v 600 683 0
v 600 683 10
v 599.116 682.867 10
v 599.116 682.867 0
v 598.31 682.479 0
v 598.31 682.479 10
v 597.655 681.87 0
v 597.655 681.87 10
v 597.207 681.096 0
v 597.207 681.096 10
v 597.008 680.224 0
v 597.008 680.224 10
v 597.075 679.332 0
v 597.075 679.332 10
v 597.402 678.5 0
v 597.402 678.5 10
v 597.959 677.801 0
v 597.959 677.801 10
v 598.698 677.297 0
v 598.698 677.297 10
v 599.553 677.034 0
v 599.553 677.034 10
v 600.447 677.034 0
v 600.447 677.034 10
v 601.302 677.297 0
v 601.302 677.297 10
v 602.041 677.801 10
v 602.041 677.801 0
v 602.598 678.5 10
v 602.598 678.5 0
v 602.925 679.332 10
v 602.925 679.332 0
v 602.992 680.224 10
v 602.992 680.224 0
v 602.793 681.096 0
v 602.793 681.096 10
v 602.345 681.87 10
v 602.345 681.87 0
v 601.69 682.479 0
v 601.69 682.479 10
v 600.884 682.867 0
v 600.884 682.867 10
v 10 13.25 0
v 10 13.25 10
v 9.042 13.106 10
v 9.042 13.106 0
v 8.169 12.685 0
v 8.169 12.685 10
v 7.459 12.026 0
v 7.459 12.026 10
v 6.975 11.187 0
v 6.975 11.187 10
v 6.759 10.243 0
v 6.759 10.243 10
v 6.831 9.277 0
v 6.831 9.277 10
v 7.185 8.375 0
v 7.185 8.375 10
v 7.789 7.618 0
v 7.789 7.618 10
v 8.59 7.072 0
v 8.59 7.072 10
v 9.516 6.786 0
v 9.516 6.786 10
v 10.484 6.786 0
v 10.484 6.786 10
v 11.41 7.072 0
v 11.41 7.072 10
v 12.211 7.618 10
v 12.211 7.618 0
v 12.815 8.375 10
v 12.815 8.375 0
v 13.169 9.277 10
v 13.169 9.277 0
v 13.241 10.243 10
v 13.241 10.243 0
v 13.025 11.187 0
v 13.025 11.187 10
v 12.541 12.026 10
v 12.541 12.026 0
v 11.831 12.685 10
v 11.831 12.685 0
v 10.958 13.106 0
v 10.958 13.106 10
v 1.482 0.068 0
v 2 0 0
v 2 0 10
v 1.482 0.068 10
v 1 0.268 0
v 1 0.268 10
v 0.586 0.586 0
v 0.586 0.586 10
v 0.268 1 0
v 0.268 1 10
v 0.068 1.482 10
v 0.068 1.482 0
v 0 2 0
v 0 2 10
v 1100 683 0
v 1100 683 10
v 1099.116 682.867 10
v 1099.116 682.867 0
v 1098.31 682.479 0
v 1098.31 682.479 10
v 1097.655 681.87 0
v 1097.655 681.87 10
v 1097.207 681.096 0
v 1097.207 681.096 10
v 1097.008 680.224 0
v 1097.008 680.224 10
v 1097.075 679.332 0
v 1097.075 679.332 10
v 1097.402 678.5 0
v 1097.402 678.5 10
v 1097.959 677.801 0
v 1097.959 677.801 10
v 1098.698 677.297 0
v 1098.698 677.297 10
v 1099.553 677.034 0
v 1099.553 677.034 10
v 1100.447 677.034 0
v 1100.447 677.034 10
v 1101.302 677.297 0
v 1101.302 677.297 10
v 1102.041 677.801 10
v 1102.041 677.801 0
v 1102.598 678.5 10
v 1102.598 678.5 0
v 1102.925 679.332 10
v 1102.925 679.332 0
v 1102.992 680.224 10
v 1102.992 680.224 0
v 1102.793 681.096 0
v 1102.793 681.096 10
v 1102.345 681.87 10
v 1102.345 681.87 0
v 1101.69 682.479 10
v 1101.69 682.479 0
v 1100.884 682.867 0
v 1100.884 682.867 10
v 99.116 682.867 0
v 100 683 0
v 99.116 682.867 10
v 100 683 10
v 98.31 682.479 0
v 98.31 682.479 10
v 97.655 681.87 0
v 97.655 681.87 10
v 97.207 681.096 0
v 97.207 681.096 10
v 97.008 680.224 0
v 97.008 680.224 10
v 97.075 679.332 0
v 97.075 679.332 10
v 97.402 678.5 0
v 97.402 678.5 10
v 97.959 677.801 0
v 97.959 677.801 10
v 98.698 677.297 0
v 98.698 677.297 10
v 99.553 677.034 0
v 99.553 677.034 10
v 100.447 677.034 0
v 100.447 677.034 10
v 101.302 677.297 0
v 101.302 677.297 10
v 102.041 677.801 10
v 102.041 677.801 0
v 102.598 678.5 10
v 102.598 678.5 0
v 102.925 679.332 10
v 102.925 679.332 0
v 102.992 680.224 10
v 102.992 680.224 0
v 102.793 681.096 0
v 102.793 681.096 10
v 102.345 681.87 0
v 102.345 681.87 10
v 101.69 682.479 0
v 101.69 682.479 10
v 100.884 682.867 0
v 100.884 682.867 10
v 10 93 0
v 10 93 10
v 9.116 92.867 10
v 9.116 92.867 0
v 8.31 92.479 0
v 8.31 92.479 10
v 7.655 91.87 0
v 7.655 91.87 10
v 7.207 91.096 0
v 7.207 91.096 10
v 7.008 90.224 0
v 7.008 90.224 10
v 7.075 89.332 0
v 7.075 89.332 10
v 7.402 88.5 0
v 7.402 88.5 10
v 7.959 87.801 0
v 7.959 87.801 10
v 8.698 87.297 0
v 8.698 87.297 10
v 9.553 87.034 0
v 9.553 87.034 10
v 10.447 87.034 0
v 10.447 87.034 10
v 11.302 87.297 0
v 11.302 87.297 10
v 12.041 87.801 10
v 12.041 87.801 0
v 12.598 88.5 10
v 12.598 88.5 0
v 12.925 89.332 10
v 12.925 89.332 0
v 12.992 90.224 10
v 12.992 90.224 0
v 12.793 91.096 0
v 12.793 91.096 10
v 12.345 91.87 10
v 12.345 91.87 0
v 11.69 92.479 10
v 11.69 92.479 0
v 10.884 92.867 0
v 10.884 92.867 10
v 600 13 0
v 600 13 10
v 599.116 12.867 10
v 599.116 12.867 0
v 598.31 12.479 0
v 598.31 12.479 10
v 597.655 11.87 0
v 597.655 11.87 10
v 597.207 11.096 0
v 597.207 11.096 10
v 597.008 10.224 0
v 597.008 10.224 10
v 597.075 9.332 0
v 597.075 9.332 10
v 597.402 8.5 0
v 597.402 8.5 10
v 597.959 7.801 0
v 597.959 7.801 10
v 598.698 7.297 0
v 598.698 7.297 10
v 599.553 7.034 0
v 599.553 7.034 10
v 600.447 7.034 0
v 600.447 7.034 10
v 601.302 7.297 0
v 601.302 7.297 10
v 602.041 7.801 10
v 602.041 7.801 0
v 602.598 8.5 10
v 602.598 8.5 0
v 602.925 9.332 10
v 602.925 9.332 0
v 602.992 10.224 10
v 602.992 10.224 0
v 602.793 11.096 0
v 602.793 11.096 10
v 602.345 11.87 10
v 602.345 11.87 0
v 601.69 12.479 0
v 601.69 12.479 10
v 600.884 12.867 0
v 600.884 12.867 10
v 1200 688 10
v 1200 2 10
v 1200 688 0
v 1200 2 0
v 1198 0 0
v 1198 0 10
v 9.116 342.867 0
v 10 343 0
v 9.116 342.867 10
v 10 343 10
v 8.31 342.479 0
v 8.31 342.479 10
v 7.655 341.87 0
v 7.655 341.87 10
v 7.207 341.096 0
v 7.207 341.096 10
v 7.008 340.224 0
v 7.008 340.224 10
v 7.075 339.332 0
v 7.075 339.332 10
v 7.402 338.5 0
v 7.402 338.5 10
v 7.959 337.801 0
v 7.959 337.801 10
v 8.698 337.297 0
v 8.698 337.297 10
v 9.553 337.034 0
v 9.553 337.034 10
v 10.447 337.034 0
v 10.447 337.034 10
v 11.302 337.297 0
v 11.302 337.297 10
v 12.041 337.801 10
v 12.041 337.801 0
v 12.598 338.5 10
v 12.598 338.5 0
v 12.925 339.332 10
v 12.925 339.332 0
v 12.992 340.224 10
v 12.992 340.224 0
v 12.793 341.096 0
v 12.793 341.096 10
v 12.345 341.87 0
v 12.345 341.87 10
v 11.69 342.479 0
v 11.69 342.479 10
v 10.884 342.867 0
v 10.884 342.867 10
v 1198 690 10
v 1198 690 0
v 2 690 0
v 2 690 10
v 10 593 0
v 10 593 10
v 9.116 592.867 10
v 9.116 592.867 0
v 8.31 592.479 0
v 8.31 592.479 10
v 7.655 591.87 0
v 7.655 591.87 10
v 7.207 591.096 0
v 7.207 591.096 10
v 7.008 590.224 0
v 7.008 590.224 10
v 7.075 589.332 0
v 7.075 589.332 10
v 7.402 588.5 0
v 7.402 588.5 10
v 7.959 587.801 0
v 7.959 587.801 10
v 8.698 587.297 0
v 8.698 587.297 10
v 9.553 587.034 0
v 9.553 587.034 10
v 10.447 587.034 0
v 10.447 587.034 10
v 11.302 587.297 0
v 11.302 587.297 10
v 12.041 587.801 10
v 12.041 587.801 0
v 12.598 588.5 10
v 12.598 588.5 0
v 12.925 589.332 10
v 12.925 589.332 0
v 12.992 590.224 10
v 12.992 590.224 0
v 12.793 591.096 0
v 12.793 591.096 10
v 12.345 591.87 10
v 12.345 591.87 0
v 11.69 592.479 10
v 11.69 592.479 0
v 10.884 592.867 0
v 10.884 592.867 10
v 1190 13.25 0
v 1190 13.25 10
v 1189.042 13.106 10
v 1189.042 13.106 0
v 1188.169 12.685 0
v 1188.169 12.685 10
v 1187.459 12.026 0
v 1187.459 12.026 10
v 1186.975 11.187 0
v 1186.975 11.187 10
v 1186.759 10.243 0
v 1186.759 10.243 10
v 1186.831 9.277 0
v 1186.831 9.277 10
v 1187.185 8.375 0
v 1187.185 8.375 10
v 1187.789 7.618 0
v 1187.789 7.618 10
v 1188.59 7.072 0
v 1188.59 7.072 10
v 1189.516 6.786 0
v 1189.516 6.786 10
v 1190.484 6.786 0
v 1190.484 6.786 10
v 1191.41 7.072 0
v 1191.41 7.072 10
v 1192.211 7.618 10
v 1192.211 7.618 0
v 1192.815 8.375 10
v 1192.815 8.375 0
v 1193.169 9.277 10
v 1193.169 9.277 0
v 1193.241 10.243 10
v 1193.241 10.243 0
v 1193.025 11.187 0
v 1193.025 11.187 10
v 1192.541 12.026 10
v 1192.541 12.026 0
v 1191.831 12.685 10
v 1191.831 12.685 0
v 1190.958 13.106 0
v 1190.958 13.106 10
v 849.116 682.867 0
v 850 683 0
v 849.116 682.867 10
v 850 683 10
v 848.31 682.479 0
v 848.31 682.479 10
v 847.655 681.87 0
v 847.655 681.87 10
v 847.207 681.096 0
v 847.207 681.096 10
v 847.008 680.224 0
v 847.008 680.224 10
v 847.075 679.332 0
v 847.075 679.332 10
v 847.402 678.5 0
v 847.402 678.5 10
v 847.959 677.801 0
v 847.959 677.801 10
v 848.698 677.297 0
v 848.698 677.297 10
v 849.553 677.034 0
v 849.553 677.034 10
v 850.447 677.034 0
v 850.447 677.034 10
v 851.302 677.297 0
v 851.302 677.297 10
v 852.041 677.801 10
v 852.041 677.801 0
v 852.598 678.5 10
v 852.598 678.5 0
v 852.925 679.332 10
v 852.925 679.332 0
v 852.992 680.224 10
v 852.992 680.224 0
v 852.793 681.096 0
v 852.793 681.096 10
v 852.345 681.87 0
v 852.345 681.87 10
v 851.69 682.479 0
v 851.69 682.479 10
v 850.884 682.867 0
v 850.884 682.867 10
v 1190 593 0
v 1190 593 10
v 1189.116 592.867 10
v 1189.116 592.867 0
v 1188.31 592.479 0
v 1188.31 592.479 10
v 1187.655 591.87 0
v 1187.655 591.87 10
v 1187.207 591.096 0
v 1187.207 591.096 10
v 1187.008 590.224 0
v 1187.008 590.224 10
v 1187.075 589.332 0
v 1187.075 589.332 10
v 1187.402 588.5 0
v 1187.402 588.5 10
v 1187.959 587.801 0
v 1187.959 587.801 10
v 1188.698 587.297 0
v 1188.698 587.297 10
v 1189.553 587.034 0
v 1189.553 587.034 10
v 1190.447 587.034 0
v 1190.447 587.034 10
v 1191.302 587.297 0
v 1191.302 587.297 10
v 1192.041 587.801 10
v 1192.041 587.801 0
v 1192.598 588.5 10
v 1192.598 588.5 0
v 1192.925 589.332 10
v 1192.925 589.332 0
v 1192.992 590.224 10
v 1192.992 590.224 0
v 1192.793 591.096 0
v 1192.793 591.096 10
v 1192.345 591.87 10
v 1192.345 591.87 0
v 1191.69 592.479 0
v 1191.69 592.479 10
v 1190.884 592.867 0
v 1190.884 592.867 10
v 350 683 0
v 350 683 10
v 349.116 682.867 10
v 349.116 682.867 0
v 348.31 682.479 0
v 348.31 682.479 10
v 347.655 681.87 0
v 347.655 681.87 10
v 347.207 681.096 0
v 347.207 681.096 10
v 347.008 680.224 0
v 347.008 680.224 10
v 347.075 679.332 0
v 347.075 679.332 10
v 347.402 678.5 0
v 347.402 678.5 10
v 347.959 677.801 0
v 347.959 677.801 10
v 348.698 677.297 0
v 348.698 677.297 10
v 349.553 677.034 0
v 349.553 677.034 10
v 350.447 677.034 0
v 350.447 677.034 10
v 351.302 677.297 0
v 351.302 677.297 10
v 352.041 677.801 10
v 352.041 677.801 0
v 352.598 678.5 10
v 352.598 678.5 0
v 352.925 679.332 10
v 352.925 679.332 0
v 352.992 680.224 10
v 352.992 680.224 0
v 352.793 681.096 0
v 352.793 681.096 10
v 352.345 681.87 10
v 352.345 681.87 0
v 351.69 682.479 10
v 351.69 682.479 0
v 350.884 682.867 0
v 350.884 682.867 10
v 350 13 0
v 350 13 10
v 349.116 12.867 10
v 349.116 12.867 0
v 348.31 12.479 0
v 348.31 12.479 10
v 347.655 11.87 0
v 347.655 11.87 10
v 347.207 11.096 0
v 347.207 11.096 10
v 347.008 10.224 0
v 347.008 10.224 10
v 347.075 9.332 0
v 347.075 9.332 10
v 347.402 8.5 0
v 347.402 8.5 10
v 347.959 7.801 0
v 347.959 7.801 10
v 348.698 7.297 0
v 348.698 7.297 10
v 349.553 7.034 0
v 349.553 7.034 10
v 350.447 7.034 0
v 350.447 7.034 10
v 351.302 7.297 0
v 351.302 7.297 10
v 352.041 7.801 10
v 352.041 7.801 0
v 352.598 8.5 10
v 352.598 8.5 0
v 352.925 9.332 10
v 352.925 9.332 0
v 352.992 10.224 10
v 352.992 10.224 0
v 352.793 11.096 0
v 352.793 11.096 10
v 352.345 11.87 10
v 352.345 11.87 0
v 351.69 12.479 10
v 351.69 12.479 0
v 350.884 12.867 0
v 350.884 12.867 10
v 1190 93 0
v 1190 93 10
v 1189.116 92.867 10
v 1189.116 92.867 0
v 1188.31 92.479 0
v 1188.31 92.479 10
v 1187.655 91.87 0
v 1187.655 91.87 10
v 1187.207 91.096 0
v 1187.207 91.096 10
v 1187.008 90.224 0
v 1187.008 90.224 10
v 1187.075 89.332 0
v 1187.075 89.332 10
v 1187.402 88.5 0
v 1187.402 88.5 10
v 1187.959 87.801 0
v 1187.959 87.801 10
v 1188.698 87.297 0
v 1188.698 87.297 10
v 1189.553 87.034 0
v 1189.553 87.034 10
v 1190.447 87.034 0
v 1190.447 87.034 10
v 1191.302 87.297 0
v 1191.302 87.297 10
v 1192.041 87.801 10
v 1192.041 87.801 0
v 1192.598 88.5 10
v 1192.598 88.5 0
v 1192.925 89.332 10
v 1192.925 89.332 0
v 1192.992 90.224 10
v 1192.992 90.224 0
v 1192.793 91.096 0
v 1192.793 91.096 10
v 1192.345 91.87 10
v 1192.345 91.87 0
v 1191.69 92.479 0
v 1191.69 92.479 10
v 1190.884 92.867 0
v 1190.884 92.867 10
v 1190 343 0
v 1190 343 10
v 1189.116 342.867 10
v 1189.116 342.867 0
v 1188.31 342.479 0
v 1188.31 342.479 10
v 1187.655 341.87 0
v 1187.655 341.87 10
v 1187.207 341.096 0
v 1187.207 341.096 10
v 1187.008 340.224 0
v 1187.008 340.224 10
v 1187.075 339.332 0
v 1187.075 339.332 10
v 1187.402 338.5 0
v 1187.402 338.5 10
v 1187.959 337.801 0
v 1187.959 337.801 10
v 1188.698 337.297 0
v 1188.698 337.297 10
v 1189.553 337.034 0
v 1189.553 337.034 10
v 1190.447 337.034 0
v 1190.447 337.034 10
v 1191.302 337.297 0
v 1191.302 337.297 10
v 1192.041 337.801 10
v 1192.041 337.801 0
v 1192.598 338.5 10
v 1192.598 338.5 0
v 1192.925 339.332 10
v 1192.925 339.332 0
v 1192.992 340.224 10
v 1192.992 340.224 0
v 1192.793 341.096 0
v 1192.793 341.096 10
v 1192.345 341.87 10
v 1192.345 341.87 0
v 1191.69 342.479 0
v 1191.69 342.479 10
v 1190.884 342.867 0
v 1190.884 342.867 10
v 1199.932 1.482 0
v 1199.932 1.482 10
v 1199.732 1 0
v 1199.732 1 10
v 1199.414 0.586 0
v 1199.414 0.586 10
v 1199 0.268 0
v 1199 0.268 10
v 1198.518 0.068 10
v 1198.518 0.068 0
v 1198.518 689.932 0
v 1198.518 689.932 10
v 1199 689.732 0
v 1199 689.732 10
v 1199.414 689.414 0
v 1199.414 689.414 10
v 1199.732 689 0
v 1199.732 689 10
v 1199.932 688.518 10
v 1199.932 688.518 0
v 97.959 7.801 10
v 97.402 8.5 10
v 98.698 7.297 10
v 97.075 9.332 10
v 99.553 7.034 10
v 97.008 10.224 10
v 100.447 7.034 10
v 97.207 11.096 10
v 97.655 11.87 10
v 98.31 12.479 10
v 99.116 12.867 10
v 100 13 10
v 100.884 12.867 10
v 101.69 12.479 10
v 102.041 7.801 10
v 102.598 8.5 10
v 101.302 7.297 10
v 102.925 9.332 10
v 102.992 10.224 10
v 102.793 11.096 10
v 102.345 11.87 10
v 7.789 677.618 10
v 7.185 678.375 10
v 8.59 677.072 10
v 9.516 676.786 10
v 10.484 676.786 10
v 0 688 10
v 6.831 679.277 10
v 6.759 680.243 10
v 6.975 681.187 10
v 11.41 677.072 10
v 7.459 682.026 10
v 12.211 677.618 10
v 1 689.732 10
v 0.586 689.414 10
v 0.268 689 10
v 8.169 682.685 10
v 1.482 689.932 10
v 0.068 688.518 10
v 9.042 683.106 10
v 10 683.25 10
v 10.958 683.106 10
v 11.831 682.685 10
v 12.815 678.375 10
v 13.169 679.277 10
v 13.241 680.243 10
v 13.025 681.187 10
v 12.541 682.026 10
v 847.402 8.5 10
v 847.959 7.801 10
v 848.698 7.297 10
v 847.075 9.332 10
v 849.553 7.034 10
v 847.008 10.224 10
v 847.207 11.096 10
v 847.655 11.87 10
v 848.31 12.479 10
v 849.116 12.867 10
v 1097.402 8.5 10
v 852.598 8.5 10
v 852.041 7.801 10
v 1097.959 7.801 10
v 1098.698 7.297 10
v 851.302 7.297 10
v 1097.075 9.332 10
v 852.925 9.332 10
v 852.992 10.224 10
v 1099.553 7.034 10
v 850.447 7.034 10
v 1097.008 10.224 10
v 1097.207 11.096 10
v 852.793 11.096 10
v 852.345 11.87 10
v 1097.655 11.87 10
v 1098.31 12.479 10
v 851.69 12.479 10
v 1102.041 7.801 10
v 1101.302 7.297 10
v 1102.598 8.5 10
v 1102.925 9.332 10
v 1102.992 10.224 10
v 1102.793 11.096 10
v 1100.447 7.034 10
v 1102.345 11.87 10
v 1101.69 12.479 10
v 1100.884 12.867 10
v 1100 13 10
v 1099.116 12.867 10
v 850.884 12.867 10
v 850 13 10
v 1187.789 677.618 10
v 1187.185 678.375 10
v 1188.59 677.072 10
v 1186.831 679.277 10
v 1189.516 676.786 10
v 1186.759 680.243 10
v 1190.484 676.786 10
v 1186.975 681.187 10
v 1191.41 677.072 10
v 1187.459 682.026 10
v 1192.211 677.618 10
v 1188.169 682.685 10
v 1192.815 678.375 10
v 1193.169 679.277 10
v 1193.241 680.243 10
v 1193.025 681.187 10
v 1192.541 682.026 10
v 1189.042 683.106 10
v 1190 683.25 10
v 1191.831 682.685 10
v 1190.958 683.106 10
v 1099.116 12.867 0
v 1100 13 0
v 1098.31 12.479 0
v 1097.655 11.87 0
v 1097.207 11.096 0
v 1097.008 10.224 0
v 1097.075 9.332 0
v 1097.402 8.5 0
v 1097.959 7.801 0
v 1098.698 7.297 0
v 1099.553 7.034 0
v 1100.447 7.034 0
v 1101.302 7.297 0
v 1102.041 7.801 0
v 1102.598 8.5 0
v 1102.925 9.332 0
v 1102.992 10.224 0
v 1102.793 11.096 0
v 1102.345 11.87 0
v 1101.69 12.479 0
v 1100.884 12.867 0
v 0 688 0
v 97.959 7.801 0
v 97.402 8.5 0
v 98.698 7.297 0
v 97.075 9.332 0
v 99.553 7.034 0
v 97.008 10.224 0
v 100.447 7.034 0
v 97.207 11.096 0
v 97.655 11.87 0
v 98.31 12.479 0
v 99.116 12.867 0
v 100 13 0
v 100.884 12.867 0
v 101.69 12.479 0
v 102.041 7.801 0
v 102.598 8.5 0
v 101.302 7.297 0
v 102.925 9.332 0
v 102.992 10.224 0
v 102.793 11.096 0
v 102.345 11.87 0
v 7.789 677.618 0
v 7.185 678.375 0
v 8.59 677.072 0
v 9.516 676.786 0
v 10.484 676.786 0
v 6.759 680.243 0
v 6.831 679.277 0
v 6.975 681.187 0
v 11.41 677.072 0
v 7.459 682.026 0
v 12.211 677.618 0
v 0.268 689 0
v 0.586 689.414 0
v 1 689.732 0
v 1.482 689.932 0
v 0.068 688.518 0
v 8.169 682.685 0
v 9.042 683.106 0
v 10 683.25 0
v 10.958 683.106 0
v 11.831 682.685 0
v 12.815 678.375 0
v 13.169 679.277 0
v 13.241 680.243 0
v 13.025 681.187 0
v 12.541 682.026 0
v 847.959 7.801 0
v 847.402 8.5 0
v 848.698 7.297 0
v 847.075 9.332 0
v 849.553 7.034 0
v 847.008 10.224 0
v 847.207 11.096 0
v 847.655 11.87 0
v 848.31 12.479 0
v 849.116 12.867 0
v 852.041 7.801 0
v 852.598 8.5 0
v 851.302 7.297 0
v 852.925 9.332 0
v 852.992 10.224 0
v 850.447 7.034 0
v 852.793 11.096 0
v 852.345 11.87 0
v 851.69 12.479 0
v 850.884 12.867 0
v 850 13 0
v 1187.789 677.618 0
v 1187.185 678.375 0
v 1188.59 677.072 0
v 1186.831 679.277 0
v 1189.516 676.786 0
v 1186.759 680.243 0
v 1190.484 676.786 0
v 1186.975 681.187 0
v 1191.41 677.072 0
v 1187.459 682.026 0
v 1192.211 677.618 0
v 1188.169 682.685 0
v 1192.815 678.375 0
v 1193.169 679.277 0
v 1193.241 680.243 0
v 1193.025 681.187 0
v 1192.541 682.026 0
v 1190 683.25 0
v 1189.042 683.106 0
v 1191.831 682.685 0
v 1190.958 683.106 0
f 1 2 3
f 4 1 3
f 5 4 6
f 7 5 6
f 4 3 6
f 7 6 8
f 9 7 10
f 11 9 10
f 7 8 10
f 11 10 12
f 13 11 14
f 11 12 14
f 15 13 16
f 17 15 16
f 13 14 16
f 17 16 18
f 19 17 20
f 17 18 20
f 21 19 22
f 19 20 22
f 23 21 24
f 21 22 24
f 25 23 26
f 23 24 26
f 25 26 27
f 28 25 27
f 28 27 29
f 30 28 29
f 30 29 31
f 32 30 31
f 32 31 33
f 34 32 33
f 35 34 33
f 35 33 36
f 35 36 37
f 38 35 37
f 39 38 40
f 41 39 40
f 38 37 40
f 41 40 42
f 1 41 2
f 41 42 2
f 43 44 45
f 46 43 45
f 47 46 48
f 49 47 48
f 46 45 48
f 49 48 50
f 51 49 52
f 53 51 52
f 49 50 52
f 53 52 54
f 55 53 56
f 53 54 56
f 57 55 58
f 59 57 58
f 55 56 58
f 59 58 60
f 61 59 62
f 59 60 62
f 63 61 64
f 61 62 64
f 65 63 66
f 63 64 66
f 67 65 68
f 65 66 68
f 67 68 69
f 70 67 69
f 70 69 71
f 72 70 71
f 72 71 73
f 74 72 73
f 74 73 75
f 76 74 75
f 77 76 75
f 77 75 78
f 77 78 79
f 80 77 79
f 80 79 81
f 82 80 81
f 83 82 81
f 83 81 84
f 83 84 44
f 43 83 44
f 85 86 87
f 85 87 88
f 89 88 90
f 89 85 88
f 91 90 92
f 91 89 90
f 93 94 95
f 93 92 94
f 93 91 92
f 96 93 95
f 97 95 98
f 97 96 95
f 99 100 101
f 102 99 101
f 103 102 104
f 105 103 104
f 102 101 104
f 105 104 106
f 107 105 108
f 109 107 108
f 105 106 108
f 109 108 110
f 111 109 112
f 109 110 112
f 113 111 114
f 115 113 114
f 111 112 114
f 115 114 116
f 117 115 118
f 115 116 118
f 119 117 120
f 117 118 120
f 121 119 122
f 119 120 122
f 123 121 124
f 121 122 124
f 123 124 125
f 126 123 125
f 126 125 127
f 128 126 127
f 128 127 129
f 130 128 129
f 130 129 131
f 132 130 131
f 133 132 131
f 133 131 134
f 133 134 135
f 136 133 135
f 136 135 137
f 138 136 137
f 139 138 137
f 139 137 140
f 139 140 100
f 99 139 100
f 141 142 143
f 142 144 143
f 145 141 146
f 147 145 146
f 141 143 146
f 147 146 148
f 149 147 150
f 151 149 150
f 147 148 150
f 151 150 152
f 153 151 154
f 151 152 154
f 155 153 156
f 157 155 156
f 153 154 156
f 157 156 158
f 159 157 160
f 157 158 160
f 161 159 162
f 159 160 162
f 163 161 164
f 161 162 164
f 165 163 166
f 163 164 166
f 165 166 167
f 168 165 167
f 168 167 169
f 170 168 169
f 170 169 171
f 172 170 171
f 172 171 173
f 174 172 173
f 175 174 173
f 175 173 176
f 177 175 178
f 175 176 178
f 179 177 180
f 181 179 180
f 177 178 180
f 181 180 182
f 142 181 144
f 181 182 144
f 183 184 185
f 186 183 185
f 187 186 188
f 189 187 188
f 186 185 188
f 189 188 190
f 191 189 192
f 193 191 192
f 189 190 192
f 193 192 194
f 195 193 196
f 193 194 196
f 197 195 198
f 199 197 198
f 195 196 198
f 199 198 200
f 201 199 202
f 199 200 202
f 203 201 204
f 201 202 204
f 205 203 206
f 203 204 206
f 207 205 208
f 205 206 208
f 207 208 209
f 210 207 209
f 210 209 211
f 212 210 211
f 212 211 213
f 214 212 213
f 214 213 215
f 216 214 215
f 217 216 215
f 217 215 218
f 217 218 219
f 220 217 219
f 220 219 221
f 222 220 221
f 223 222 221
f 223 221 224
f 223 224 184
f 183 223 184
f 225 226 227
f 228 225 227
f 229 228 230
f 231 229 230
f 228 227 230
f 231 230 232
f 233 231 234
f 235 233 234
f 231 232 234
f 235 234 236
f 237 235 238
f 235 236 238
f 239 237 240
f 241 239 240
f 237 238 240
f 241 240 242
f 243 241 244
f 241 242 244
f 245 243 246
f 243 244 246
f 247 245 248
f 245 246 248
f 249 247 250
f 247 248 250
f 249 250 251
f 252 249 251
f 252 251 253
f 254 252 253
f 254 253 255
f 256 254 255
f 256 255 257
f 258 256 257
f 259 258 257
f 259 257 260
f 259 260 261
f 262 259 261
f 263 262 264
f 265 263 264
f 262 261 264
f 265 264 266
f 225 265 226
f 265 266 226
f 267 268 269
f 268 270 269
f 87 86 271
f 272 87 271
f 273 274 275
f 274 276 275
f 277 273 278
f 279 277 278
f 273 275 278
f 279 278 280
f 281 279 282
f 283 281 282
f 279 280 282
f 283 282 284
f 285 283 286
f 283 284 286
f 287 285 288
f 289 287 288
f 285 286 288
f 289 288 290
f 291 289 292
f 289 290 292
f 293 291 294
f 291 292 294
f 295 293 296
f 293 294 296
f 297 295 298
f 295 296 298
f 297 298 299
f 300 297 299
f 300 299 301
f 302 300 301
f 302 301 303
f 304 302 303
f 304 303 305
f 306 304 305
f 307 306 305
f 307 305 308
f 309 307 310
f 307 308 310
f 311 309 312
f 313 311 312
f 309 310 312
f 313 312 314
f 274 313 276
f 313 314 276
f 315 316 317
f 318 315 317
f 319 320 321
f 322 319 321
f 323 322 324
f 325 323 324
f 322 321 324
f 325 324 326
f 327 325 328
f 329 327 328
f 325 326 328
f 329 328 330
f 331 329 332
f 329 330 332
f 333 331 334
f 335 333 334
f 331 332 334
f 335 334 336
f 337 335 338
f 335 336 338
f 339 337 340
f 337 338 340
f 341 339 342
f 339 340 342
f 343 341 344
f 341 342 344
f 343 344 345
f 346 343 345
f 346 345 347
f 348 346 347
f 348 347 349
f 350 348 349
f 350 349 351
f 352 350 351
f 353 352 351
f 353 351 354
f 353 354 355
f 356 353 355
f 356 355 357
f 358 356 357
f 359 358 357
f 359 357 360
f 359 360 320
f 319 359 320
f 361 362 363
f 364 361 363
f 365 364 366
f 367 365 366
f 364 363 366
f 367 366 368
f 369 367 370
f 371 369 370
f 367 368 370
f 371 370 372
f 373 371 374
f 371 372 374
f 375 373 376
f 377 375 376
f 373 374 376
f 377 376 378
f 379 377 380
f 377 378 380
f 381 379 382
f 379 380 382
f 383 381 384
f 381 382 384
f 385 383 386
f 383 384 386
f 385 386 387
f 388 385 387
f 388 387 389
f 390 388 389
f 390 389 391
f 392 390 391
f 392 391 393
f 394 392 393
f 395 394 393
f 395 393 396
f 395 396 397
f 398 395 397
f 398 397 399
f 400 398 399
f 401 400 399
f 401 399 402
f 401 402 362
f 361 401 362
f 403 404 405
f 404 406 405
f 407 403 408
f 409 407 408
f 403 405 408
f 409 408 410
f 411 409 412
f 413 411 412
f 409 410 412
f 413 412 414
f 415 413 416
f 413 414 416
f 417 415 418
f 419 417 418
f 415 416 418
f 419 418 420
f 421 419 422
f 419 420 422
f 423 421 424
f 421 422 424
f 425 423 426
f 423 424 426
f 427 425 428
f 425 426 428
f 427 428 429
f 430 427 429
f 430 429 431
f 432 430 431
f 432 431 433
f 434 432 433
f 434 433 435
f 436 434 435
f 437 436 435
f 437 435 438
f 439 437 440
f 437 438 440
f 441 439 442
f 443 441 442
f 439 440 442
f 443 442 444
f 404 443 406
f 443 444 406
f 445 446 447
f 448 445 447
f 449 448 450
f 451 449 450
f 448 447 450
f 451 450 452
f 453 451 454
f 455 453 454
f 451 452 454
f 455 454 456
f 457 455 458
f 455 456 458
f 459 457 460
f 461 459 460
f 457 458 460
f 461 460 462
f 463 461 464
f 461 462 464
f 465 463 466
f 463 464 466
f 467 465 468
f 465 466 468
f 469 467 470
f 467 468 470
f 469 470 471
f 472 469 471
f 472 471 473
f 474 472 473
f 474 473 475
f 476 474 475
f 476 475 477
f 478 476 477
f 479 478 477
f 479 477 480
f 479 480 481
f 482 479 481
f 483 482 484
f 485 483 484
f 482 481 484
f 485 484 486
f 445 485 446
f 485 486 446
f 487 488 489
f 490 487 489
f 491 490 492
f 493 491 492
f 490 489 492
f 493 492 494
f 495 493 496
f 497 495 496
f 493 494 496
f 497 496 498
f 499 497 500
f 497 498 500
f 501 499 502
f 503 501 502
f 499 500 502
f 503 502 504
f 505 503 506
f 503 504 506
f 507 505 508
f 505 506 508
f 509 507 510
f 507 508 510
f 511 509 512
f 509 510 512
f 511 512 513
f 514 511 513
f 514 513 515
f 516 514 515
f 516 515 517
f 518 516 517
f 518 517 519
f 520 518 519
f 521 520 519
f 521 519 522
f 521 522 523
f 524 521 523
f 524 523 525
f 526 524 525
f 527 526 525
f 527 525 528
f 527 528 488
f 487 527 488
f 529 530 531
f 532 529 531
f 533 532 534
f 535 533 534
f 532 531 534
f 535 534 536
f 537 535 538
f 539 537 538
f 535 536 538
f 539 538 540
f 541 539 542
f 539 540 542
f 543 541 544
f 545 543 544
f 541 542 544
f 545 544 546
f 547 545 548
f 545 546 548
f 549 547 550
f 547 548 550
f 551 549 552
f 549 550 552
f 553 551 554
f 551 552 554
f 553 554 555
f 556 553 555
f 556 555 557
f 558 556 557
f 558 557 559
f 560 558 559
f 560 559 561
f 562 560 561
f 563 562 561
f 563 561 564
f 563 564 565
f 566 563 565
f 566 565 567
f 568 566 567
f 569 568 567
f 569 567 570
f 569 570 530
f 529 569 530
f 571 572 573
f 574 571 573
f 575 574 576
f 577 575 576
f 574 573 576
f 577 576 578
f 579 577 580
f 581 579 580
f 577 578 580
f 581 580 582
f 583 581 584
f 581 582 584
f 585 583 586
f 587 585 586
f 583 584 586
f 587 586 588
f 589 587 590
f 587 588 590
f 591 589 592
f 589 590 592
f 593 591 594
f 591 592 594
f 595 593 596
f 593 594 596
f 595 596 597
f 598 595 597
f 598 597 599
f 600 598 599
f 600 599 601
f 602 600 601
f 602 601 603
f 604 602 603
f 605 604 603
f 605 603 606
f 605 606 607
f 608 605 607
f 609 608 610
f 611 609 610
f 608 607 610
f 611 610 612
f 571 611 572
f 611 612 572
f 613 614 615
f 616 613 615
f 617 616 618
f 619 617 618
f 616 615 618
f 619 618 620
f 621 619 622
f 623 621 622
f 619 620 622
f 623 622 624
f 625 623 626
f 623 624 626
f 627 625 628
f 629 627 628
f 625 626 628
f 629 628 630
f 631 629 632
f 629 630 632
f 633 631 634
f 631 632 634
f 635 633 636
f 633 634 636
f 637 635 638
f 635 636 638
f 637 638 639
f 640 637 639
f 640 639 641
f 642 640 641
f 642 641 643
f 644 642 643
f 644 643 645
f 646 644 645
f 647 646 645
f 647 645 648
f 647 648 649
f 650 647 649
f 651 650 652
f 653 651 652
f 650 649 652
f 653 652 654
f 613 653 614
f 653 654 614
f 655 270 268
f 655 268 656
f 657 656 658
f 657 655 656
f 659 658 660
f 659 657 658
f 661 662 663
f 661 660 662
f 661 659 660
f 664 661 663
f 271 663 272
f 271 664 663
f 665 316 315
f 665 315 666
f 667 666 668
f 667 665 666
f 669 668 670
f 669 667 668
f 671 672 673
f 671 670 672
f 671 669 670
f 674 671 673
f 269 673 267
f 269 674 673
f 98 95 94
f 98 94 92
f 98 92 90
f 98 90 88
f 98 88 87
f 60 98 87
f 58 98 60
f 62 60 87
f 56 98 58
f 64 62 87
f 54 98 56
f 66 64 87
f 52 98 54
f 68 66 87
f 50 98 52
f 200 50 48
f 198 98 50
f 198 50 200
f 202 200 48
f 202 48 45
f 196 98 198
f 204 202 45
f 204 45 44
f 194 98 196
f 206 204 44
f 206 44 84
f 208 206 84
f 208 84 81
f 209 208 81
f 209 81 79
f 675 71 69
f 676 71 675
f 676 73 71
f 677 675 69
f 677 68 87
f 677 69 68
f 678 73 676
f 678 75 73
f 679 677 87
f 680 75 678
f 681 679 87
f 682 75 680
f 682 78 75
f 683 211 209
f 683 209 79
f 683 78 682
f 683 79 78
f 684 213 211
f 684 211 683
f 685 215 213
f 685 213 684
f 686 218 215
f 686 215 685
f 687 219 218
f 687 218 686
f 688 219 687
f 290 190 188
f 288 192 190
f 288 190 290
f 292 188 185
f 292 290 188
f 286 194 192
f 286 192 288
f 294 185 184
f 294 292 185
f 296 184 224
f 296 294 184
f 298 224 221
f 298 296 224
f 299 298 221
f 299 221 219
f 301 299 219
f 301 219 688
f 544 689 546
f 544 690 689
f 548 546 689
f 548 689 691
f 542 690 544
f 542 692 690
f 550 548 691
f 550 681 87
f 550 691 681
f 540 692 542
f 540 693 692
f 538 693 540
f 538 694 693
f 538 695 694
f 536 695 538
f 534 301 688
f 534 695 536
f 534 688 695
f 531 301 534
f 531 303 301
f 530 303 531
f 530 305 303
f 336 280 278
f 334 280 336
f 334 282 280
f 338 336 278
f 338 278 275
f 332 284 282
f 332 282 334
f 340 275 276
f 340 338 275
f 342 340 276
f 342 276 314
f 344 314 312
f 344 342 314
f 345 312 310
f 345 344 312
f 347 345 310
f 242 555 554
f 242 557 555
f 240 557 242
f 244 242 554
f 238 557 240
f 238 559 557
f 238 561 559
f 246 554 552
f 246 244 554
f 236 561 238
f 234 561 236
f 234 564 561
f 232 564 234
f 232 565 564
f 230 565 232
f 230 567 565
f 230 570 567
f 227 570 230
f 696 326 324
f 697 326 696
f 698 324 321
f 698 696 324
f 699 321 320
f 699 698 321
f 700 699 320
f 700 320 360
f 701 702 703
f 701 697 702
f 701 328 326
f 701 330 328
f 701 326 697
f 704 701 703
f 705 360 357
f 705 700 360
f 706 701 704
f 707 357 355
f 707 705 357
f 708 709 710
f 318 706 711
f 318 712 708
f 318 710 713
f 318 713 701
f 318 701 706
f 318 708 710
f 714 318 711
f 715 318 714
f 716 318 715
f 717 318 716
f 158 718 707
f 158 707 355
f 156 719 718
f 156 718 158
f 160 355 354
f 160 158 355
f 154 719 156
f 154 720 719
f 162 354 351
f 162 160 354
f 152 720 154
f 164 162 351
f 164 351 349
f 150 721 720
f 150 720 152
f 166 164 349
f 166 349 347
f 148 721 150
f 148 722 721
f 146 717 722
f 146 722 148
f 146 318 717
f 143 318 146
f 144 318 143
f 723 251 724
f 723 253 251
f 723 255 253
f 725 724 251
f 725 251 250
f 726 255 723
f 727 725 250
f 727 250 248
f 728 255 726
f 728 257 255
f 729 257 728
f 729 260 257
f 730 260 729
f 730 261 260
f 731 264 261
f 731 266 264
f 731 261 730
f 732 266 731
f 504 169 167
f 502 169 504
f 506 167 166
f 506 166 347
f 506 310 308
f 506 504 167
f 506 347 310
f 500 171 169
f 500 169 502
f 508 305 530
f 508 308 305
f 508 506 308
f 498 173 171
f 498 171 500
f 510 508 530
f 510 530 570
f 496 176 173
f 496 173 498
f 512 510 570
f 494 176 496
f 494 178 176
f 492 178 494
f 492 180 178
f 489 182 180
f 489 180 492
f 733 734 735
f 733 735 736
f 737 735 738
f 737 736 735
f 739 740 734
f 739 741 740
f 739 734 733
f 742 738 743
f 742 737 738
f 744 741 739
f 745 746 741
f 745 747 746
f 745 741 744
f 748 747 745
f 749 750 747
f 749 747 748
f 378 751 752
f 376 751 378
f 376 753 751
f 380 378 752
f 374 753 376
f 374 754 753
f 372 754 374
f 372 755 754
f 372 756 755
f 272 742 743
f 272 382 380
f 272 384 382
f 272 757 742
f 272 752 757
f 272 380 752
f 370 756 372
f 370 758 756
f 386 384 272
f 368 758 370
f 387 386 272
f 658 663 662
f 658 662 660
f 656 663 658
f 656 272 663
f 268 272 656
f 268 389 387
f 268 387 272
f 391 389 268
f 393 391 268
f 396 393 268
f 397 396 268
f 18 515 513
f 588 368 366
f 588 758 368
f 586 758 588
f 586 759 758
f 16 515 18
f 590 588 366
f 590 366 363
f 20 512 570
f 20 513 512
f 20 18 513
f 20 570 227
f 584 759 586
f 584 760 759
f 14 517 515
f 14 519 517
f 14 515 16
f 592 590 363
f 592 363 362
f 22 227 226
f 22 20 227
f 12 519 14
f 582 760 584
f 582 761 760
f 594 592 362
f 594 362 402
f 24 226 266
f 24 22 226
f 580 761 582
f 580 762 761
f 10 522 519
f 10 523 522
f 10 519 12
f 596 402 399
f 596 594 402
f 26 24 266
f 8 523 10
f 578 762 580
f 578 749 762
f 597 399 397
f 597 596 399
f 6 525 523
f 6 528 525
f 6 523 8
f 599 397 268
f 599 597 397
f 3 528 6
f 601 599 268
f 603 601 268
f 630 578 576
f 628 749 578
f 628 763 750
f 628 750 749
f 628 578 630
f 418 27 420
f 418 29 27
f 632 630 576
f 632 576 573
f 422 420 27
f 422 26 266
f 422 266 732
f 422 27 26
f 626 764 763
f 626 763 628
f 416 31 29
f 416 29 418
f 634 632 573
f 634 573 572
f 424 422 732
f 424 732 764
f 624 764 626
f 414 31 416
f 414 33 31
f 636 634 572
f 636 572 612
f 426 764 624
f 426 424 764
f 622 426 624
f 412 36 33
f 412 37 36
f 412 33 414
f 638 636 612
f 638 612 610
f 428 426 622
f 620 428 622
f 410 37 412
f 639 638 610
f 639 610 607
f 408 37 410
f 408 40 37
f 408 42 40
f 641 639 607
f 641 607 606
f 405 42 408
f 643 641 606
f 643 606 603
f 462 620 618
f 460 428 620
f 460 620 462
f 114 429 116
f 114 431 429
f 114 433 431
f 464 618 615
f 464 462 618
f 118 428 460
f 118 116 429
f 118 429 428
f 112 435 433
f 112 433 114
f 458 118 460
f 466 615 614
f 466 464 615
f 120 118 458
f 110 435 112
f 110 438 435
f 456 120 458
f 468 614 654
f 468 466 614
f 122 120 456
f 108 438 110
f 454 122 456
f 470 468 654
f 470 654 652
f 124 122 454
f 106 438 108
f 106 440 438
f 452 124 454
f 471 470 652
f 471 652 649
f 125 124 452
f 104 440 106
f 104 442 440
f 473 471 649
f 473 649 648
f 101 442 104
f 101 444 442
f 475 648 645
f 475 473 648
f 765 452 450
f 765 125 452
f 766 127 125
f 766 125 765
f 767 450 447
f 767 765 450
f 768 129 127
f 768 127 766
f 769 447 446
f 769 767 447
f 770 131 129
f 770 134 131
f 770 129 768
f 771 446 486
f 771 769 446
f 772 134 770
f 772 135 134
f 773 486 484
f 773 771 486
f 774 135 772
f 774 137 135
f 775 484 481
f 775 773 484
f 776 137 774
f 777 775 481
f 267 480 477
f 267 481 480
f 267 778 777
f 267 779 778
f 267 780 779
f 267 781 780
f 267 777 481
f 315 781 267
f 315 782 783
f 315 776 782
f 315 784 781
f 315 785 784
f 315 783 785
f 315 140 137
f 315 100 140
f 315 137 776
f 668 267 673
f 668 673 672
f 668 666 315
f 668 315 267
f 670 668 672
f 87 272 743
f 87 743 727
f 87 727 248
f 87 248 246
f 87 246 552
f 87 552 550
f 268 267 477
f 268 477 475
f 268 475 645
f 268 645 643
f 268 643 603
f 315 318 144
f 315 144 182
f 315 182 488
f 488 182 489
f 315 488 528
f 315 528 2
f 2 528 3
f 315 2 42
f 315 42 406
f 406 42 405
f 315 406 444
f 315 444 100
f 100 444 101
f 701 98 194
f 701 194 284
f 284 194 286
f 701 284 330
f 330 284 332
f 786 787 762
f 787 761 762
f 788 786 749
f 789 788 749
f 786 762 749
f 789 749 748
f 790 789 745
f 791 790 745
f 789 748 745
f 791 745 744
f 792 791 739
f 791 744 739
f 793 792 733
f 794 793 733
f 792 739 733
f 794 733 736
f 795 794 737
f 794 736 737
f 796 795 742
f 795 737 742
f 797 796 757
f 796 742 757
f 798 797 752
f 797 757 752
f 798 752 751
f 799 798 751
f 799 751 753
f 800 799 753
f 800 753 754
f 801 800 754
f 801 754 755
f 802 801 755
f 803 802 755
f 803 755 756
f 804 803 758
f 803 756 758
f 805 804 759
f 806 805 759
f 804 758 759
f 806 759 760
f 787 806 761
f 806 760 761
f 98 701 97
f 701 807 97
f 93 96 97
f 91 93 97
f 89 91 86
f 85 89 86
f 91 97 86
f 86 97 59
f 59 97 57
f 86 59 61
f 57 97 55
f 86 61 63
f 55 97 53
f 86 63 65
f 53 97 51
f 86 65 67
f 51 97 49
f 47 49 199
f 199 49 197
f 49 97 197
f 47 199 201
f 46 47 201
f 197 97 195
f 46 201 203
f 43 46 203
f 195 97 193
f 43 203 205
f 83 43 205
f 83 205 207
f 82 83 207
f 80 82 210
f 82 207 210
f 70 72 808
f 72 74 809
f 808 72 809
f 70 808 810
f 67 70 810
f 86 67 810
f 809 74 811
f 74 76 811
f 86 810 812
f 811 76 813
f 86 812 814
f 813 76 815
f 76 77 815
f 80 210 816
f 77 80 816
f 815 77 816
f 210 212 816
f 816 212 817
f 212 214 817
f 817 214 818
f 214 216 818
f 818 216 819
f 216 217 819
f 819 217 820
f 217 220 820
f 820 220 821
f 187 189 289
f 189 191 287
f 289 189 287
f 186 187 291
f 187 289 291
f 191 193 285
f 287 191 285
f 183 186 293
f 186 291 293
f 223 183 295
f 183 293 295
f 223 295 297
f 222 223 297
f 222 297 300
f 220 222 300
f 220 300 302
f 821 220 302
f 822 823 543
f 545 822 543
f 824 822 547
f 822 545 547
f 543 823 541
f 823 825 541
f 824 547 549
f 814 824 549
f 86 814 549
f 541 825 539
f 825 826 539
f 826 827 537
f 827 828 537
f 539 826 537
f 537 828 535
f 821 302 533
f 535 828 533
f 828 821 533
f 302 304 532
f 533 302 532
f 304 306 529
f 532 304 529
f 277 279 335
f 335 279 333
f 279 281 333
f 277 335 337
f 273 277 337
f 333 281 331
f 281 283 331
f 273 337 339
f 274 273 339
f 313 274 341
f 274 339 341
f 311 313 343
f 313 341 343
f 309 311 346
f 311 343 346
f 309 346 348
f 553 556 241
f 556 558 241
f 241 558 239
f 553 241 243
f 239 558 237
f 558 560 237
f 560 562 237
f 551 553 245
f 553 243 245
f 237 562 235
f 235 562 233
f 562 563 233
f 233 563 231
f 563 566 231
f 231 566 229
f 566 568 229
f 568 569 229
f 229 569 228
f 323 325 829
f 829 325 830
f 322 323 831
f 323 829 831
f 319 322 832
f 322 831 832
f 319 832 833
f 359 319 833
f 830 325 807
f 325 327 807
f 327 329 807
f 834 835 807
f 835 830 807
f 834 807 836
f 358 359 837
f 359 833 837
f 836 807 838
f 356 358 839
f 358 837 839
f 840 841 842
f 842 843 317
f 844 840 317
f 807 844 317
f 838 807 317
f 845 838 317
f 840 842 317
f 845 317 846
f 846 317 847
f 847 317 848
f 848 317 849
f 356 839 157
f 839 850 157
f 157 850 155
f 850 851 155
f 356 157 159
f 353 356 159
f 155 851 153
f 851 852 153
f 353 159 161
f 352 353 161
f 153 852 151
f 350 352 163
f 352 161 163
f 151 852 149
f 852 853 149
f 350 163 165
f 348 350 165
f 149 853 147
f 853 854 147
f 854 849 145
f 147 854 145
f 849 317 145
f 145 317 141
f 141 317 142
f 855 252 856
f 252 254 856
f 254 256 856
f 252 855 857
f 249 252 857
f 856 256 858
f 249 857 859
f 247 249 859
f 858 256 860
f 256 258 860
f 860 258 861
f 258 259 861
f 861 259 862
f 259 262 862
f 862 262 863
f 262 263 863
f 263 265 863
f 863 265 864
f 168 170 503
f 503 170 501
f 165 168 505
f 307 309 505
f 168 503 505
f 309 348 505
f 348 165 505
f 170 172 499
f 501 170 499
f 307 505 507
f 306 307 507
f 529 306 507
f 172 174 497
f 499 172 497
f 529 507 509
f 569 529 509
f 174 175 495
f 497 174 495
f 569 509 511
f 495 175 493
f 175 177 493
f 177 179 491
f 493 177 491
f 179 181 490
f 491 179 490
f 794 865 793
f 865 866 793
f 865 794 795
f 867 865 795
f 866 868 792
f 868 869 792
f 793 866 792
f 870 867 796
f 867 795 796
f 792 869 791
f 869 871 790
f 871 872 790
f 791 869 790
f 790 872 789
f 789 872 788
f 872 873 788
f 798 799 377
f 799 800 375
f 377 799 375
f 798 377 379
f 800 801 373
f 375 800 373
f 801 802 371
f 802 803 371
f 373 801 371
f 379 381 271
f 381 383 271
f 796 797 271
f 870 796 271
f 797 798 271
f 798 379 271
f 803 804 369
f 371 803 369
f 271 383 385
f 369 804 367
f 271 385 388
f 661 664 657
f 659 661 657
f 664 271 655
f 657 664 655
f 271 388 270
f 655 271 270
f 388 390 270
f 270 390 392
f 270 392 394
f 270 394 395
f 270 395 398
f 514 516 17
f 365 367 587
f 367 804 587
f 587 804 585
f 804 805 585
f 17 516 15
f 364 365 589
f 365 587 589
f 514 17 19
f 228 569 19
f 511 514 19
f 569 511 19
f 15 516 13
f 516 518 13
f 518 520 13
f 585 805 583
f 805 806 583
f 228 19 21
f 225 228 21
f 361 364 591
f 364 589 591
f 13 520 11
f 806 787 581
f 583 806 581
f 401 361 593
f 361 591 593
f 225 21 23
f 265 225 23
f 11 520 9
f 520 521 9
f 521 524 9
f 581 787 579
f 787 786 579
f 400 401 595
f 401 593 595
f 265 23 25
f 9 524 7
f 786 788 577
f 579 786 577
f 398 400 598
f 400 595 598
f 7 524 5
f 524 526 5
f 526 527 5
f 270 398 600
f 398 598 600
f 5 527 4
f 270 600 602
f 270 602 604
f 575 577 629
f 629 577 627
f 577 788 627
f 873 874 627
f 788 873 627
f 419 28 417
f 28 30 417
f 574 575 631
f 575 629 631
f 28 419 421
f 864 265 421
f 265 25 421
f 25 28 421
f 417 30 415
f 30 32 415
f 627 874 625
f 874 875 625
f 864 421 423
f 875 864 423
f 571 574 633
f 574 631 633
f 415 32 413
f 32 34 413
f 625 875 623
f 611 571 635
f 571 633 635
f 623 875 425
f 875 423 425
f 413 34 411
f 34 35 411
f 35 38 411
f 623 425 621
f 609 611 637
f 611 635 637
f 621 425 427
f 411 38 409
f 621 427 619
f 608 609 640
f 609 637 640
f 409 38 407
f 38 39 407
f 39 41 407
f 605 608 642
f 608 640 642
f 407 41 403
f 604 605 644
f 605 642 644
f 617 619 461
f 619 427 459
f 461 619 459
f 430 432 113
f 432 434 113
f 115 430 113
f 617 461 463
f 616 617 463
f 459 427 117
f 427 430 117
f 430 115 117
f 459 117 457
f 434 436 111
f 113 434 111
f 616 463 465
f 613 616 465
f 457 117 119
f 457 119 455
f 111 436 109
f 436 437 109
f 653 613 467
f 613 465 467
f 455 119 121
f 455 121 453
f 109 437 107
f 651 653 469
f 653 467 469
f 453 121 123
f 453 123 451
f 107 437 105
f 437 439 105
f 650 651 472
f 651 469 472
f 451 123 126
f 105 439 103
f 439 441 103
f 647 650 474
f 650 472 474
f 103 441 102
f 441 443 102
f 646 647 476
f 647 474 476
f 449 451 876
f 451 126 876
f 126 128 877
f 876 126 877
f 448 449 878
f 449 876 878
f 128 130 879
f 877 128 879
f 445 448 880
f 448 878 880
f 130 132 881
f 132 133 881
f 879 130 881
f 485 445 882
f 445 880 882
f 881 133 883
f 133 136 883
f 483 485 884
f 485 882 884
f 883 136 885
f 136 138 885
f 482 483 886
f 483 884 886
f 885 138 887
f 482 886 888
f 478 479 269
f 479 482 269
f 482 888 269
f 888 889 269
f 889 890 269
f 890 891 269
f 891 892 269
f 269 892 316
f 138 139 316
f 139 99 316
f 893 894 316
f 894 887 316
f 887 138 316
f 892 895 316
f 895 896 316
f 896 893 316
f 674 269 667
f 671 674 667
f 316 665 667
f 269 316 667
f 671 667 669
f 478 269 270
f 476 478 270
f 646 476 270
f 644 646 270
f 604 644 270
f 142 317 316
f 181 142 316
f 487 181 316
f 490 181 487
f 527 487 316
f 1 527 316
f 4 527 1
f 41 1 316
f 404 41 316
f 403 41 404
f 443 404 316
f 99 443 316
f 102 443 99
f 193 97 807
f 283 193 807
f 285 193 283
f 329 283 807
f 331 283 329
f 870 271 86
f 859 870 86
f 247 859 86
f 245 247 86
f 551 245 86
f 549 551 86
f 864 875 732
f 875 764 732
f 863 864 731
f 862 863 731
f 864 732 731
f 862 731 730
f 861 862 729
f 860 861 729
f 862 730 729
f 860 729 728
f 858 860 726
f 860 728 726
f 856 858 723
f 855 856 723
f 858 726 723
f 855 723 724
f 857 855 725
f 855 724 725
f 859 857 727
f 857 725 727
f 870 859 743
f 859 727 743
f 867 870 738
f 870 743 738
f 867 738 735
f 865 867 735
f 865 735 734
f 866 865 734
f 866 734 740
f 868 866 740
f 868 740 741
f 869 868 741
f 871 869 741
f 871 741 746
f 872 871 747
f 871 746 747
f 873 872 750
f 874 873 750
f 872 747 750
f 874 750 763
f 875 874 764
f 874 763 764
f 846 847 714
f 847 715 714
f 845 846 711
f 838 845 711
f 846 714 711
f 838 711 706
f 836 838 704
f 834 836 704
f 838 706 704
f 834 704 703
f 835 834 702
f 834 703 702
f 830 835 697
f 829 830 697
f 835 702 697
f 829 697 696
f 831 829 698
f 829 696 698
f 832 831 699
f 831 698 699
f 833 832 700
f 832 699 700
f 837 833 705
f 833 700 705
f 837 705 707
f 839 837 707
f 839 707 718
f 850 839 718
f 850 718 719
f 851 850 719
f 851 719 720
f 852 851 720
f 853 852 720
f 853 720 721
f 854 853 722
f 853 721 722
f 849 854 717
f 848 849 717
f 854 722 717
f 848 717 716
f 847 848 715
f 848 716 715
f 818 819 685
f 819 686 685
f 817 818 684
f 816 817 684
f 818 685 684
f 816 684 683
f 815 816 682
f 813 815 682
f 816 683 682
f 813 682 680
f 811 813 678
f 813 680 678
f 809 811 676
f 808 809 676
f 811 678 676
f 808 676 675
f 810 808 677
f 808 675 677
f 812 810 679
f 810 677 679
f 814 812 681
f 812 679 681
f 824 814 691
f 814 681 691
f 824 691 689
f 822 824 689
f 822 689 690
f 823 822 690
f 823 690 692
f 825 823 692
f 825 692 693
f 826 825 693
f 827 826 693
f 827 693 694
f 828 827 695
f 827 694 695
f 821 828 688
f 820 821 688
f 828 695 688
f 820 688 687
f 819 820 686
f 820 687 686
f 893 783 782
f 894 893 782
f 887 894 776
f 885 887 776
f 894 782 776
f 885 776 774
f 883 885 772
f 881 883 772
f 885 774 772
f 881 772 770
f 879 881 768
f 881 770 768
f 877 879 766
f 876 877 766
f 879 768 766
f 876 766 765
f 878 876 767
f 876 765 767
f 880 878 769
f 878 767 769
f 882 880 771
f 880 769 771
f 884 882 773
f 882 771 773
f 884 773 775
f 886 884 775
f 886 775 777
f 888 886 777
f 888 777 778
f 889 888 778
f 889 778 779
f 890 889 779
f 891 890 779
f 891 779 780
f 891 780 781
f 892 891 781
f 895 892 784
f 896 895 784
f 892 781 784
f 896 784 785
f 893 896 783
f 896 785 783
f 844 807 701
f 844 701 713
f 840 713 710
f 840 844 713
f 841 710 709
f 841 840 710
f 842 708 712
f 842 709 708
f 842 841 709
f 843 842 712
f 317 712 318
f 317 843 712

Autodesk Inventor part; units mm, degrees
ref_plane "YZ Plane" through (0, 0, 0) normal (1, 0, 0) x (0, 1, 0)
ref_plane "XZ Plane" through (0, 0, 0) normal (0, 1, 0) x (-1, 0, 0)
ref_plane "XY Plane" through (0, 0, 0) normal (0, 0, 1) x (1, 0, 0)
sketch "Skizze1" plane through (0, 0, 0) normal (0, 0, 1) x (1, 0, 0)
  line L0 (2, 0) -> (1198, 0)
  line L1 (1200, 2) -> (1200, 688)
  line L2 (1198, 690) -> (2, 690)
  line L3 (0, 688) -> (0, 2)
  arc A0 (2, 690) -> (0, 688) centre (2, 688) ccw
  arc A1 (1200, 688) -> (1198, 690) centre (1198, 688) ccw
  arc A2 (1198, 0) -> (1200, 2) centre (1198, 2) ccw
  arc A3 (0, 2) -> (2, 0) centre (2, 2) ccw
  point P0 (0, 0)
  point P1 (1200, 690)
  point P2 (1200, 0)
  point P3 (0, 690)
  dimension "d0" = 1200
  dimension "d1" = 690
  dimension "d2" = 2
extrude "Extrusion1" add sketch "Skizze1" along normal blind 10
sketch "Sketch2" plane through (0, 0, 0) normal (0, 0, -1) x (-1, 0, 0)
  circle A0 centre (-10, 10) radius 3.25
  line L0 (-2, 0) -> (-1198, 0) projected
  line L1 (0, 688) -> (0, 2) projected
  line L2 (-600, -175.8373) -> (-600, 803.7474) construction
  line L3 (202.1324, 345) -> (-1409.3068, 345) construction
  circle A1 centre (-1190, 10) radius 3.25
  circle A2 centre (-10, 680) radius 3.25
  line L4 (-2, 690) -> (-1198, 690)
  circle A3 centre (-1190, 680) radius 3.25
  point P0 (0, 0)
  point P1 (-1200, 0)
  point P2 (-1200, 2)
  point P3 (0, 690)
  point P4 (-1200, 690)
  point P5 (-1200, 688)
  dimension "d5" = 6.5
  dimension "d6" = 10
  dimension "d7" = 10
  dimension "d8" = 600
  dimension "d9" = 345
hole "Hole1" at (10, 10, 0) at (1190, 10, 0) at (1190, 680, 0) at (10, 680, 0) direction (0, 0, 1) diameter 6.5 end through all
sketch "Sketch3" plane through (0, 0, 0) normal (0, 0, -1) x (-1, 0, 0)
  circle A0 centre (-10, 590) radius 3
  line L0 (0, 688) -> (0, 2) projected
  line L1 (-1198, 690) -> (-2, 690) projected
  circle A1 centre (-10, 340) radius 3
  circle A2 centre (-10, 90) radius 3
  line L2 (-600, 869.8508) -> (-600, -209.8368) construction
  circle A3 centre (-1190, 590) radius 3
  circle A4 centre (-1190, 340) radius 3
  circle A5 centre (-1190, 90) radius 3
  circle A6 centre (-100, 680) radius 3
  circle A7 centre (-350, 680) radius 3
  circle A8 centre (-600, 680) radius 3
  circle A9 centre (-850, 680) radius 3
  circle A10 centre (-1100, 680) radius 3
  line L3 (113.1305, 345) -> (-1507.9608, 345) construction
  circle A11 centre (-100, 10) radius 3
  circle A12 centre (-350, 10) radius 3
  circle A13 centre (-600, 10) radius 3
  circle A14 centre (-850, 10) radius 3
  circle A15 centre (-1100, 10) radius 3
  point P0 (0, 0)
  dimension "d17" = 6
  dimension "d19" = 100
  dimension "d22" = 250
  dimension "d27" = 600
  dimension "d33" = 250
  dimension "d38" = 345
hole "Hole2" at (10, 590, 0) at (10, 90, 0) at (100, 10, 0) at (350, 10, 0) at (600, 10, 0) at (600, 680, 0) at (850, 10, 0) at (1100, 10, 0) at (1190, 90, 0) at (1190, 340, 0) at (1190, 590, 0) at (1100, 680, 0) at (850, 680, 0) direction (0, 0, 1) diameter 6 end through all
sketch "Sketch4" plane through (0, 0, 0) normal (0, 0, -1) x (-1, 0, 0)
  circle A0 centre (-100, 680) radius 3
  line L0 (0, 688) -> (0, 2) projected
  line L1 (-1198, 690) -> (-2, 690) projected
  circle A1 centre (-350, 680) radius 3
  point P0 (0, 0)
  dimension "d46" = 100
  dimension "d47" = 10
  dimension "d48" = 6
  dimension "d51" = 250
hole "Hole3" at (100, 680, 0) direction (0, 0, 1) diameter 6 end through all
sketch "Sketch5" plane through (0, 0, 0) normal (0, 0, -1) x (-1, 0, 0)
  circle A0 centre (-350, 680) radius 3
  circle A1 centre (-100, 680) radius 3 projected
  line L0 (-1198, 690) -> (-2, 690) projected
  point P0 (0, 0)
  dimension "d63" = 250
  dimension "d64" = 10
  dimension "d65" = 6
hole "Hole4" at (350, 680, 0) direction (0, 0, 1) diameter 6 end through all
sketch "Sketch6" plane through (0, 0, 0) normal (0, 0, -1) x (-1, 0, 0)
  circle A0 centre (-10, 340) radius 3
  circle A1 centre (-10, 590) radius 3 projected
  line L0 (0, 688) -> (0, 2) projected
  point P0 (0, 0)
  dimension "d73" = 250
  dimension "d74" = 10
  dimension "d75" = 6
hole "Hole5" at (10, 340, 0) direction (0, 0, 1) diameter 6 end through all
equation "\"d10\" = d5"
equation "\"d39\" = d17"
equation "\"d56\" = d17"
equation "\"d66\" = d65"
equation "\"d76\" = d75"
properties part number "101.001.01_Bodenplatte" material "Stahl, hochfest, niedrig legiert"
